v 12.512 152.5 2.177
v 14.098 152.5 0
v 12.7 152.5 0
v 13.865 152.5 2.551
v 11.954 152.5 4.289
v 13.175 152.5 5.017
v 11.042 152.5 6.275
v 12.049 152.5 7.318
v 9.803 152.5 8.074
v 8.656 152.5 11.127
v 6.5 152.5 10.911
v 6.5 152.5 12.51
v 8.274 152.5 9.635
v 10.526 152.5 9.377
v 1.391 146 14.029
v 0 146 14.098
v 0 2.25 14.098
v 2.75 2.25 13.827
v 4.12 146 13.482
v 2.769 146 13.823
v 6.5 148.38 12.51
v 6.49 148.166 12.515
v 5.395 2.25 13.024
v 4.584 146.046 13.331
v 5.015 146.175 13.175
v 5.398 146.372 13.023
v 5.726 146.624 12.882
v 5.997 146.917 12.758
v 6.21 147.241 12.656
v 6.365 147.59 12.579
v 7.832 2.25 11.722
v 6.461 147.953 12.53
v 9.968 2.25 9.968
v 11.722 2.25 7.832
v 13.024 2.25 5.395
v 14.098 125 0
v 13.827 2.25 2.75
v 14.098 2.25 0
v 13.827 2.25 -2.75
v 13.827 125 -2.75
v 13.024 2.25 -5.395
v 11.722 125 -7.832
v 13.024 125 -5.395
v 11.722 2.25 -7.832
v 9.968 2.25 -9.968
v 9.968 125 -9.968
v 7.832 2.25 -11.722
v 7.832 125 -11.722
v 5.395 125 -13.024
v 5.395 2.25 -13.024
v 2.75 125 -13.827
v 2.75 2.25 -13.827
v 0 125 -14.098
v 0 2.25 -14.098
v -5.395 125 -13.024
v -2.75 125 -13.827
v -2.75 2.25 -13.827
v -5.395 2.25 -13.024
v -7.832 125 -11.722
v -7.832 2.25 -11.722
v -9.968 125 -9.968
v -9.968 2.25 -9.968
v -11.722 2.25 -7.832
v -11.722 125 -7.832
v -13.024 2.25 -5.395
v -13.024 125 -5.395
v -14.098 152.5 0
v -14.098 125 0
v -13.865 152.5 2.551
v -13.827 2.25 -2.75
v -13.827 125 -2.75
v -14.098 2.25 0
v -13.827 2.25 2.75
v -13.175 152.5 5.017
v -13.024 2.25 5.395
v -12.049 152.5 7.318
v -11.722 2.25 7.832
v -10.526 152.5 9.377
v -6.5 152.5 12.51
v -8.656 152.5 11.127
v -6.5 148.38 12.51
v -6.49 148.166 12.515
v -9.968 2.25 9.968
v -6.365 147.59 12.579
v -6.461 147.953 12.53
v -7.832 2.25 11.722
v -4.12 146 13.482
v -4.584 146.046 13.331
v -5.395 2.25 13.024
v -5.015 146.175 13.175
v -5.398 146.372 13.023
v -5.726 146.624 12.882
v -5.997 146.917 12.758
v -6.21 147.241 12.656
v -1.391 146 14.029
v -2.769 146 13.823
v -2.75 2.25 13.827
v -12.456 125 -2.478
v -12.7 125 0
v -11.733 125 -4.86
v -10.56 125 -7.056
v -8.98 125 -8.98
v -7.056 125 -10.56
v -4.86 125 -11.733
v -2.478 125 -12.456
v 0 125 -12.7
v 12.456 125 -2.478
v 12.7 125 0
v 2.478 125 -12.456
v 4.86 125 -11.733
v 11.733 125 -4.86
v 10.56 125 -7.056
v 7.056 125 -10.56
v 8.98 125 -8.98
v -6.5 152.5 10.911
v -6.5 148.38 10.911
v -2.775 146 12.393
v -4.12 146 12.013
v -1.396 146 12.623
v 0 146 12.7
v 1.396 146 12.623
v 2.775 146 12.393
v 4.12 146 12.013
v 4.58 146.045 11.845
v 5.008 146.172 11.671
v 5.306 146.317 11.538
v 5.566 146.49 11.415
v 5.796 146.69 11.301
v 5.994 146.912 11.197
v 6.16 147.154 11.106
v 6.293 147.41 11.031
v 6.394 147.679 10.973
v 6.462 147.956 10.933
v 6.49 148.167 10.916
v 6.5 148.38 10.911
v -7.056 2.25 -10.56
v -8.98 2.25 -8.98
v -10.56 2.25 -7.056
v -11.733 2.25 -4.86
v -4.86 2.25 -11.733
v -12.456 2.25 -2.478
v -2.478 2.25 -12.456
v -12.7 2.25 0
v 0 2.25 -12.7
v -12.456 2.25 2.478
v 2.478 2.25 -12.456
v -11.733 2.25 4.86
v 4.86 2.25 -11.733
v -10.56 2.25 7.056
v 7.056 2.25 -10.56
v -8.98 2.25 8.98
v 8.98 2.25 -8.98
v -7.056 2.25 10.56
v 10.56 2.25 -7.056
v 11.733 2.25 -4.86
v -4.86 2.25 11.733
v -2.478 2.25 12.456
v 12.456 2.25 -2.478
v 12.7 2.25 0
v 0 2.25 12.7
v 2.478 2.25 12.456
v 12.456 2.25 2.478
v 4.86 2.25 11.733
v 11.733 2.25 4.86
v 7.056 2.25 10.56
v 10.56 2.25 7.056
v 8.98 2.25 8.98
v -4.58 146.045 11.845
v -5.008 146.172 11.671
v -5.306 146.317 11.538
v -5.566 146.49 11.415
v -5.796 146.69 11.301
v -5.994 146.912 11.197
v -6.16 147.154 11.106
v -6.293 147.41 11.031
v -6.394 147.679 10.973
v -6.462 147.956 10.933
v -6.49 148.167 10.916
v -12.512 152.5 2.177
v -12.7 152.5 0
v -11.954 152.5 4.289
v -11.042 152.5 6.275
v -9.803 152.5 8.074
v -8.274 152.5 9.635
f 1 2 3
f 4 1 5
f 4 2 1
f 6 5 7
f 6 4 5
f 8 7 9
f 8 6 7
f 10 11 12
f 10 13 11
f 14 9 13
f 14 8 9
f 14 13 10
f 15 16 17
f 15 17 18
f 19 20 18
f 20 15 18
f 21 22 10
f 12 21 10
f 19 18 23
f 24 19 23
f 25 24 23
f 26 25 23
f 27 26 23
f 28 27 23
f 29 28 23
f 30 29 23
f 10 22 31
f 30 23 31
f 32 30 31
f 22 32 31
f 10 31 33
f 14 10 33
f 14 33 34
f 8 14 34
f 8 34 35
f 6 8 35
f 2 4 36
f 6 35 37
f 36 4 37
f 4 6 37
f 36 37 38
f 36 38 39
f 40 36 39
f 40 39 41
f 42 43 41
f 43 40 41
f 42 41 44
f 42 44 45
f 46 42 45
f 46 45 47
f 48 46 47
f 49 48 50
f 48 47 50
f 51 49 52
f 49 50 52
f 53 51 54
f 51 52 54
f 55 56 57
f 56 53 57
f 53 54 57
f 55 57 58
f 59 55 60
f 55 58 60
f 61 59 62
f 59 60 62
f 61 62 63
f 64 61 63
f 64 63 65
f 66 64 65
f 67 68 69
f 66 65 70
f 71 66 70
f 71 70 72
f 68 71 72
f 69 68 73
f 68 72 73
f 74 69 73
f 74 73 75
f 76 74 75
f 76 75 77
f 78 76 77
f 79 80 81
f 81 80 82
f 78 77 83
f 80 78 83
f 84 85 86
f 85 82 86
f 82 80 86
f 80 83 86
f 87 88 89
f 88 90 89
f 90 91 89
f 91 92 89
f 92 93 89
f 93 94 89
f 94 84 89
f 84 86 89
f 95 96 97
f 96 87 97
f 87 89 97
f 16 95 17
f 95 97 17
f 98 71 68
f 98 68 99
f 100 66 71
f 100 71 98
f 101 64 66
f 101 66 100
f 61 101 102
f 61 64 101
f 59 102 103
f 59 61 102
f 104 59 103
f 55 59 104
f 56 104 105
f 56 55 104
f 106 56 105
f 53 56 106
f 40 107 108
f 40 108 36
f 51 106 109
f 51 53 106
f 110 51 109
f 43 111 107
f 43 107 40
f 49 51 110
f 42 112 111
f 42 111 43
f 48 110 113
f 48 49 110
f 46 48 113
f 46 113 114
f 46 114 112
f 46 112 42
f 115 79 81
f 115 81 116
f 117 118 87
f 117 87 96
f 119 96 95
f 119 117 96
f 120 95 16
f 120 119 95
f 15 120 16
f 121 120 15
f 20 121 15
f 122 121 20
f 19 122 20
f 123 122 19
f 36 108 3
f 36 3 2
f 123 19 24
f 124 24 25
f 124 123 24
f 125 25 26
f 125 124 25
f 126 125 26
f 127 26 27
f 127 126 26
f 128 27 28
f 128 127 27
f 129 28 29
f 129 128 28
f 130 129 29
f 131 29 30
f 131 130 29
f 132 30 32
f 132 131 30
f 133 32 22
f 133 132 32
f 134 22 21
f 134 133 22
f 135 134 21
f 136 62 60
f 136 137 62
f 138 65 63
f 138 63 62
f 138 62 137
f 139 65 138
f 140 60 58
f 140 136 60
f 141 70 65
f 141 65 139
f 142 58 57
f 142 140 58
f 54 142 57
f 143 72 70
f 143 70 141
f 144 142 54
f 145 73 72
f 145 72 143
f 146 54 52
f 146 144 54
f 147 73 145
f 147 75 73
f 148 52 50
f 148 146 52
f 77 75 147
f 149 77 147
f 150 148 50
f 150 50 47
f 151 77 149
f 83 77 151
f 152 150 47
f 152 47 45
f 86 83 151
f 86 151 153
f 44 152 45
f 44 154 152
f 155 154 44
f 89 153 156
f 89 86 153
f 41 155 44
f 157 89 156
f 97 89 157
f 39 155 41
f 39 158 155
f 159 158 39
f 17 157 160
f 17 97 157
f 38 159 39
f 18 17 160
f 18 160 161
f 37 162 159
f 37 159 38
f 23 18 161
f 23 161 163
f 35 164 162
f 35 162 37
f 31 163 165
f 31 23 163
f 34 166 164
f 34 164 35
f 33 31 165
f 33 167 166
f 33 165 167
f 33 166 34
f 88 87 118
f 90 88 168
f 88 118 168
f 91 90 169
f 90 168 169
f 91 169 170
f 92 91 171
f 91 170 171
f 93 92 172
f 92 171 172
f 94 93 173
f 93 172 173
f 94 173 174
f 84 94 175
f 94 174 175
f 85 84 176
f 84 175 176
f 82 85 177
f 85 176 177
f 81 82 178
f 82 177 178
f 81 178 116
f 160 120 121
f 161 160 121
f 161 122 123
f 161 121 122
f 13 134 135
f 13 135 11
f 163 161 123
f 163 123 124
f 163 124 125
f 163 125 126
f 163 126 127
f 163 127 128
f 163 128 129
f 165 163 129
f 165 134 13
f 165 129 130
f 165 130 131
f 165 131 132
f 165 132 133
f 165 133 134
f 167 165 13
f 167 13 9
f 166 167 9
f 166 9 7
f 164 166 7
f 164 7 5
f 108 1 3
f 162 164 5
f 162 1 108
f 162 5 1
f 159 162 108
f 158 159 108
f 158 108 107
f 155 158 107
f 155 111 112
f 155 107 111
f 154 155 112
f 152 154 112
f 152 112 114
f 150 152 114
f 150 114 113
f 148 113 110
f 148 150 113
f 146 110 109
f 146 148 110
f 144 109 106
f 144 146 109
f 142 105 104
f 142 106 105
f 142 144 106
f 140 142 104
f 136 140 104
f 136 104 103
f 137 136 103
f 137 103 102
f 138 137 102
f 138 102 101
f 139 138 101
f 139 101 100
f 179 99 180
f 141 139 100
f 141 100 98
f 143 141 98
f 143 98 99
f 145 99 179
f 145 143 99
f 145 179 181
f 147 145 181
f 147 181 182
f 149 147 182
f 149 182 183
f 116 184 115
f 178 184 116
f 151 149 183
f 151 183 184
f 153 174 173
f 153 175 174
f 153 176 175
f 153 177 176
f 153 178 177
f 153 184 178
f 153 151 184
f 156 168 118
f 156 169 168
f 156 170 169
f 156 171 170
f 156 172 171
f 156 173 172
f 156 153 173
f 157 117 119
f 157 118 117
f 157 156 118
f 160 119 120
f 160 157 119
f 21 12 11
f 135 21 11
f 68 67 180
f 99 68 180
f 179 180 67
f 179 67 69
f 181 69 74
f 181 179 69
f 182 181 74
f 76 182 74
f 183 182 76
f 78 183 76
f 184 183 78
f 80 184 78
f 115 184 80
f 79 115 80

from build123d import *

# Parameters (mm, degrees)
SKETCH1_R           = 14.0975
SKETCH1_R_2         = 12.7
BOSS_EXTRUDE1_DEPTH = 152.5
SKETCH2_W           = 29.43875972
SKETCH2_H           = 15.555523124
CUT_EXTRUDE1_DEPTH  = 27.5
SKETCH3_W           = 13
SKETCH3_H           = 5.253170184
CUT_EXTRUDE2_DEPTH  = 6.5
FILLET1_R           = 2.38
SKETCH4_W           = 35.595029472
SKETCH4_H           = 37.761683439
CUT_EXTRUDE3_DEPTH  = 2.25


with BuildPart() as part:
    # Sketch1 → Boss-Extrude1 (new body)
    with BuildSketch(Plane(origin=(0, 0, 0), x_dir=(1, 0, 0), z_dir=(0, 1, 0))):
        with Locations(Location((0, 0, 0), (0, 0, 270))):
            Circle(SKETCH1_R)
        with Locations(Location((0, 0, 0), (0, 0, 270))):
            Circle(SKETCH1_R_2, mode=Mode.SUBTRACT)
    extrude(amount=BOSS_EXTRUDE1_DEPTH)

    # Sketch2 → Cut-Extrude1 (cut)
    with BuildSketch(Plane(origin=(0, 152.5, 0), x_dir=(1, 0, 0), z_dir=(0, 1, 0))):
        with Locations((0.62187986, 7.777761562)):
            Rectangle(SKETCH2_W, SKETCH2_H)
    extrude(amount=-CUT_EXTRUDE1_DEPTH, mode=Mode.SUBTRACT)

    # Sketch3 → Cut-Extrude2 (cut)
    with BuildSketch(Plane(origin=(0, 152.5, 0), x_dir=(1, 0, 0), z_dir=(0, 1, 0))):
        with Locations((0, -11.873414908)):
            Rectangle(SKETCH3_W, SKETCH3_H)
    extrude(amount=-CUT_EXTRUDE2_DEPTH, mode=Mode.SUBTRACT)

    # Fillet1
    fillet1_edges = [part.edges().sort_by_distance(p)[0] for p in [
        (6.5, 146, 11.71006097),
        (-6.5, 146, 11.71006097),
    ]]
    fillet(fillet1_edges, radius=FILLET1_R)

    # Sketch4 → Cut-Extrude3 (cut)
    with BuildSketch(Plane.XZ):
        with Locations((0.67063099, 0.361108995)):
            Rectangle(SKETCH4_W, SKETCH4_H)
    extrude(amount=-CUT_EXTRUDE3_DEPTH, mode=Mode.SUBTRACT)


solid = part.part
